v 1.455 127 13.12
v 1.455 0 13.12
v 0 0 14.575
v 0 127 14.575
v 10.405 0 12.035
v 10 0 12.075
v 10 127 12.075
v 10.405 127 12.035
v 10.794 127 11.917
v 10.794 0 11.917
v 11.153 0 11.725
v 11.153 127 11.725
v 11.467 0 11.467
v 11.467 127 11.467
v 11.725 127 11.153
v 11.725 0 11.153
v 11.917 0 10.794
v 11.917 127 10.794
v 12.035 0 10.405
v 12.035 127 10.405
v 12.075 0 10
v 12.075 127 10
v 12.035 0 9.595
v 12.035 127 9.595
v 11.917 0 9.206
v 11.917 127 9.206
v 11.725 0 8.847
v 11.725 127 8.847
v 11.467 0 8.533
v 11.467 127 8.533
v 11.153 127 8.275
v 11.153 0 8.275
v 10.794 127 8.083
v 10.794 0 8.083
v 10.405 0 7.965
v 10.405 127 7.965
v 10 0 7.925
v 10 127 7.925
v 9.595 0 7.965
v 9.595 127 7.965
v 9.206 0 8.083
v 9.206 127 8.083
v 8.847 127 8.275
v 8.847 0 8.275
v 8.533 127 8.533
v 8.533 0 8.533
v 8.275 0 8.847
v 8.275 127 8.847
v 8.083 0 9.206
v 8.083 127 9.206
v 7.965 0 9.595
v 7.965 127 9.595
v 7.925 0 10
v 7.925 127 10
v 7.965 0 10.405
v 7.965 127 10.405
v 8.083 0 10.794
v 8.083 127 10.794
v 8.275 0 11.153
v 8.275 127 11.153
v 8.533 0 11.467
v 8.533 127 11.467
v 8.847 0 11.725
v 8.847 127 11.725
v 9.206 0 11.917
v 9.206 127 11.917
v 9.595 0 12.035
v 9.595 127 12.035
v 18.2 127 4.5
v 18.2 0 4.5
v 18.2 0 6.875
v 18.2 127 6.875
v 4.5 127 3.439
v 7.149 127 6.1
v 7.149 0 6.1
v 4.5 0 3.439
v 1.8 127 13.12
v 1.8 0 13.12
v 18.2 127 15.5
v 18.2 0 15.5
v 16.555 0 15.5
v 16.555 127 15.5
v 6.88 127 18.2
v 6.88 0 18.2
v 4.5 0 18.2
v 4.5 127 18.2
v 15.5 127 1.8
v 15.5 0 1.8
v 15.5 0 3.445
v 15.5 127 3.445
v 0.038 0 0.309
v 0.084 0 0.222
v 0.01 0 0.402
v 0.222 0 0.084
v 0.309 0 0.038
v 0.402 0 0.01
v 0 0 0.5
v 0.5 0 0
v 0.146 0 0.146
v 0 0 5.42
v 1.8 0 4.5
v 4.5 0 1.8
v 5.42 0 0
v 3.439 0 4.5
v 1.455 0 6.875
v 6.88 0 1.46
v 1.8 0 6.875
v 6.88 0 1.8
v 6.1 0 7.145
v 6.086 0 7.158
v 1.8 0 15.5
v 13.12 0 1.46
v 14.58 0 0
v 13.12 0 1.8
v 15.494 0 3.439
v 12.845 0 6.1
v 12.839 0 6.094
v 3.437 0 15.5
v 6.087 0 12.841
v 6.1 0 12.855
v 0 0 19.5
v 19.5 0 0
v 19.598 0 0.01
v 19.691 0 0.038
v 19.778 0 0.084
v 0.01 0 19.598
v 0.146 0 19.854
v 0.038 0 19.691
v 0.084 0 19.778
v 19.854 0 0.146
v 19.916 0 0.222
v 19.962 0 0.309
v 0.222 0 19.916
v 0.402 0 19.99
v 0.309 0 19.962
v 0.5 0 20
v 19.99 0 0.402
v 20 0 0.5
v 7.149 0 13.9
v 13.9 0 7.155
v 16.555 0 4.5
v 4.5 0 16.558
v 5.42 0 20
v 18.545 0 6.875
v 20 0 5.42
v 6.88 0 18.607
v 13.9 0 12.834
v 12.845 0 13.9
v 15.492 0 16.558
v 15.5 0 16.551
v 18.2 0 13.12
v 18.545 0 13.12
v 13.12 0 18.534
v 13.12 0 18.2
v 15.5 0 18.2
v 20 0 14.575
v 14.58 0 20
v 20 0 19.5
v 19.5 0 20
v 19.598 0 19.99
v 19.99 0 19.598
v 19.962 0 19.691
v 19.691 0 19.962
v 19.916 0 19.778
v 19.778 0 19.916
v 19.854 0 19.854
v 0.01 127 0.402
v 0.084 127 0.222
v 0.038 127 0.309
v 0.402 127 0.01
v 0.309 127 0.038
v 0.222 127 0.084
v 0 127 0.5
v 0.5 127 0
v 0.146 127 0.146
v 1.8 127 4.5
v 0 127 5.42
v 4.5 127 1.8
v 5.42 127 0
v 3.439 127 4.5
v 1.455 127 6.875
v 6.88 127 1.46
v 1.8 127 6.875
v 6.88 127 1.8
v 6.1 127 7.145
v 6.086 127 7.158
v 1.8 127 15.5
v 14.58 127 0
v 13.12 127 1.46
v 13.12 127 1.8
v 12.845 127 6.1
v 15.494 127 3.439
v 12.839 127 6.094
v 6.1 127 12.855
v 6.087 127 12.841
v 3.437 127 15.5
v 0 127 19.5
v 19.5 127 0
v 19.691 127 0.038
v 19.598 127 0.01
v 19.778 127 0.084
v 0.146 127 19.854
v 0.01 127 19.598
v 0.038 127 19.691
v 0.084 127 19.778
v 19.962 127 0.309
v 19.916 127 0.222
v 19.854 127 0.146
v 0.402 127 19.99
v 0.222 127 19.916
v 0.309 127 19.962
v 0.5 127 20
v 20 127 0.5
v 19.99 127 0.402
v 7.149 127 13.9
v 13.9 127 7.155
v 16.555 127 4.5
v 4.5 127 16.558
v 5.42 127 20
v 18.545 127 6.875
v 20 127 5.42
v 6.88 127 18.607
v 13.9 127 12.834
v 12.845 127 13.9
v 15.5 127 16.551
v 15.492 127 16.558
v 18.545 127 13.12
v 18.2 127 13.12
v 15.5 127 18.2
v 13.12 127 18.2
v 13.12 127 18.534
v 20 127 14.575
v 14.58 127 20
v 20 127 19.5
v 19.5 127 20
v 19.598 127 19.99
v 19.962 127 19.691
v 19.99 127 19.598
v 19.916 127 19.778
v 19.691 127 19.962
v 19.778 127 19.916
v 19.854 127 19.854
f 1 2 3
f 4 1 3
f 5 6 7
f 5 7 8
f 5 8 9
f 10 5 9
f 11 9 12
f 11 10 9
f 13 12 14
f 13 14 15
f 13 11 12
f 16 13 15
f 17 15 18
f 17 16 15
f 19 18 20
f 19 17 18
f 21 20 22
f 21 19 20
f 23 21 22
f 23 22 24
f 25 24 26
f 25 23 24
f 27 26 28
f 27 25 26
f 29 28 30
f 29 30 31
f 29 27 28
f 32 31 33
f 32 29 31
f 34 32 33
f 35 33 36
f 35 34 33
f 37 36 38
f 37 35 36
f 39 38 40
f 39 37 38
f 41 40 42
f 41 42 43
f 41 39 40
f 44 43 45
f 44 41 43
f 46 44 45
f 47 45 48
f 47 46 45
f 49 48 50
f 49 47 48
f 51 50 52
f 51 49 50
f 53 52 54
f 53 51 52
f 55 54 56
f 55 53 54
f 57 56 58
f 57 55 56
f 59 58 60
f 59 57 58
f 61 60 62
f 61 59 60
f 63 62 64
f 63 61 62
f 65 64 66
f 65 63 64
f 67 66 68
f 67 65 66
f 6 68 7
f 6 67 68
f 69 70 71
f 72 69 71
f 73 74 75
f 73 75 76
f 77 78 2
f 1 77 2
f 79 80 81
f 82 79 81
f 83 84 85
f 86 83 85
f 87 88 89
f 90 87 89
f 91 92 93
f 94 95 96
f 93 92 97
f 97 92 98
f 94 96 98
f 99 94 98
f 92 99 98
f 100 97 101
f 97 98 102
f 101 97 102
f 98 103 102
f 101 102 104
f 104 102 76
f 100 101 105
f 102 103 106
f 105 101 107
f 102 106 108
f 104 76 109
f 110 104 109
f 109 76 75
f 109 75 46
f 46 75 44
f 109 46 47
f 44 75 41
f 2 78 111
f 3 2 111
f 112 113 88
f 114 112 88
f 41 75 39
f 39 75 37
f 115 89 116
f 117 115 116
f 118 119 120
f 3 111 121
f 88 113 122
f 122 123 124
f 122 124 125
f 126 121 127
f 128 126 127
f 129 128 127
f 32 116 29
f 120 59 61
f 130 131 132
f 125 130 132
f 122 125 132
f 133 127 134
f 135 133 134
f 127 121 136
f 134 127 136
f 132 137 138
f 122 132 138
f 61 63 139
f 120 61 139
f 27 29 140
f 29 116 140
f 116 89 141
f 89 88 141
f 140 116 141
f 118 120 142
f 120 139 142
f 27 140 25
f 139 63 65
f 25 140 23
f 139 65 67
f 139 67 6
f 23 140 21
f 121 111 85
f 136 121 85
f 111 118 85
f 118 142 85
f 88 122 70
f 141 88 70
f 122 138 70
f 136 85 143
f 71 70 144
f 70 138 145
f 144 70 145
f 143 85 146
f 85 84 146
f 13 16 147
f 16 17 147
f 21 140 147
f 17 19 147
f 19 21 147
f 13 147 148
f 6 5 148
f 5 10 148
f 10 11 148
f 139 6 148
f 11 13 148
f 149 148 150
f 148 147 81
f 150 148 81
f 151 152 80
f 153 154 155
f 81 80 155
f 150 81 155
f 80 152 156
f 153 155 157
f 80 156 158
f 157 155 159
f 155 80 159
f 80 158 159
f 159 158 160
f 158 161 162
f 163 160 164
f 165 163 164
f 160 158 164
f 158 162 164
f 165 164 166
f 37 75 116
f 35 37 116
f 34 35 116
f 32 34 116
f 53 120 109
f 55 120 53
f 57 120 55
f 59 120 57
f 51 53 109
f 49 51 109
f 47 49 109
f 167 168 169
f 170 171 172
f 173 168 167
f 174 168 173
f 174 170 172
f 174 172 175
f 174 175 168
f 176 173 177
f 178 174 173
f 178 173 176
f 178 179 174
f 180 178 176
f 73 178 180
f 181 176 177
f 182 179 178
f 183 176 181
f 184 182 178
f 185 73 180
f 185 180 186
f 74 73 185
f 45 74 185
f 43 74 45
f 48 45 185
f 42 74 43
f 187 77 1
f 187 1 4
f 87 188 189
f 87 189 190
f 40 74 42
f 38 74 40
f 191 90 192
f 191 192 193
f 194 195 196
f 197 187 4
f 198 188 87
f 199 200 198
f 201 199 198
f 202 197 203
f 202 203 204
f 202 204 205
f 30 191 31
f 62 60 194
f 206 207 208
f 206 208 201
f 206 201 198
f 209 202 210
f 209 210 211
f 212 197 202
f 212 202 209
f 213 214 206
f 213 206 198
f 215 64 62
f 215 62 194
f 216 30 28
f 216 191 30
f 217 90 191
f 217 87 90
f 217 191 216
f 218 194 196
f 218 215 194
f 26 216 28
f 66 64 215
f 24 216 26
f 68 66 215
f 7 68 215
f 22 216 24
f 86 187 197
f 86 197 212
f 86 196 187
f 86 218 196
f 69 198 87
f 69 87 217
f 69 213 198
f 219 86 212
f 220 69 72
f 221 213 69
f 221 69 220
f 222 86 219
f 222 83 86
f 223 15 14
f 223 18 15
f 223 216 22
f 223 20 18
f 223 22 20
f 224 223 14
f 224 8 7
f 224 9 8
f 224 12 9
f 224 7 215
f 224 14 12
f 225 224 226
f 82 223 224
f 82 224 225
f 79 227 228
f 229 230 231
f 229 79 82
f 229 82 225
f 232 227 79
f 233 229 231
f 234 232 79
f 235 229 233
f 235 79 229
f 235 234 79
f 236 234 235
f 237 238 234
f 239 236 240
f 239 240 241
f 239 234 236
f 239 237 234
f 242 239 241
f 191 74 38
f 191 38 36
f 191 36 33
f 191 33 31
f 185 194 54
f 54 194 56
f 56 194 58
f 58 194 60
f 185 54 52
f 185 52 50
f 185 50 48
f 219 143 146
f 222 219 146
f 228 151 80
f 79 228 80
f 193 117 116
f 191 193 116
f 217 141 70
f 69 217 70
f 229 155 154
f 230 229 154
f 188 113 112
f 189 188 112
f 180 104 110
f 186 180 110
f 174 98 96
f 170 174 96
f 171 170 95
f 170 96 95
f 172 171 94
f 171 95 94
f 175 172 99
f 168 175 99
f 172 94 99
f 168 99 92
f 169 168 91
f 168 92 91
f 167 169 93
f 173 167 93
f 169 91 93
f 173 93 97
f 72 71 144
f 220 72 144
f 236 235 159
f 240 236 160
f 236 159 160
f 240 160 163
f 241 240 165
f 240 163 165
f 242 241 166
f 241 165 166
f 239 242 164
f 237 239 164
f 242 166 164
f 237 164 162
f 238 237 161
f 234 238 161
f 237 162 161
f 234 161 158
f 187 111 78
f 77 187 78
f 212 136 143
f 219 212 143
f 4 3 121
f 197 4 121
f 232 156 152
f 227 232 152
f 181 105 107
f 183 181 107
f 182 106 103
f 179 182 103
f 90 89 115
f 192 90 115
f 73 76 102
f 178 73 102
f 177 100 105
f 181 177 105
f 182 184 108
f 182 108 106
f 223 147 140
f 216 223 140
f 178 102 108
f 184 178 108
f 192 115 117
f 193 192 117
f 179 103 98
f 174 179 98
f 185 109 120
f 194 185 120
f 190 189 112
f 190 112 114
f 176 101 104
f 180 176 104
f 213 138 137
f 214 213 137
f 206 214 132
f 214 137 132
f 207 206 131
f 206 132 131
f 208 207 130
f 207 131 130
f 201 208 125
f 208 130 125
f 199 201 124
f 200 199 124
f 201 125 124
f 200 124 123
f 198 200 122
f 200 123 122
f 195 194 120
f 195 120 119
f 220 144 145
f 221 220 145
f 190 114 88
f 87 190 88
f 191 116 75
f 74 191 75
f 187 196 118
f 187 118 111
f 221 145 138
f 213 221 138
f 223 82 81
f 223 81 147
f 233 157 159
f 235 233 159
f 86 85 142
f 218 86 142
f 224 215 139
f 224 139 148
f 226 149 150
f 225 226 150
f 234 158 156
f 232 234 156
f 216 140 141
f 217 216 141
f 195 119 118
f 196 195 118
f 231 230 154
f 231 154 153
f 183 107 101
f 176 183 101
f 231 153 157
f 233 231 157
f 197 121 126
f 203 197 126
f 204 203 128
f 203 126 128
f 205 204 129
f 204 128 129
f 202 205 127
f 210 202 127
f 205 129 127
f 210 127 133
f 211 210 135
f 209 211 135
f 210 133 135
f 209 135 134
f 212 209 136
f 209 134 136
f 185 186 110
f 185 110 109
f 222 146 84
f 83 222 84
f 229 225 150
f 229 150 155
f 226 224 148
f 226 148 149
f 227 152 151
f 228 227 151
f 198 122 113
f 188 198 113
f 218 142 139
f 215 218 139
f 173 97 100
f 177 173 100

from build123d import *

# Parameters (mm, degrees)
SKETCH2_R              = 2.074585303
VSLOT2020_2020_5_DEPTH = 127


with BuildPart() as part:
    # Sketch2 → Vslot2020 2020(5) (new body)
    with BuildSketch(Plane.ZX):
        with BuildLine():
            Line((13.9, 7.149086807), (13.9, 12.844511469))
            Line((13.9, 12.844511469), (16.558493656, 15.492177728))
            Line((16.558493656, 15.492177728), (16.550703242, 15.5))
            Line((16.550703242, 15.5), (18.2, 15.5))
            Line((18.2, 15.5), (18.2, 13.12))
            Line((18.2, 13.12), (18.534428266, 13.12))
            Line((18.534428266, 13.12), (20, 14.58))
            Line((20, 14.58), (20, 19.5))
            ThreePointArc((20, 19.5), (19.853553391, 19.853553391), (19.5, 20))
            Line((19.5, 20), (14.575, 20))
            Line((14.575, 20), (13.12, 18.545))
            Line((13.12, 18.545), (13.12, 18.2))
            Line((13.12, 18.2), (15.5, 18.2))
            Line((15.5, 18.2), (15.5, 16.555))
            Line((15.5, 16.555), (12.834142613, 13.9))
            Line((12.834142613, 13.9), (7.155, 13.9))
            Line((7.155, 13.9), (4.5, 16.555))
            Line((4.5, 16.555), (4.5, 18.2))
            Line((4.5, 18.2), (6.875, 18.2))
            Line((6.875, 18.2), (6.875, 18.545))
            Line((6.875, 18.545), (5.42, 20))
            Line((5.42, 20), (0.5, 20))
            ThreePointArc((0.5, 20), (0.146446609, 19.853553391), (0, 19.5))
            Line((0, 19.5), (0, 14.58))
            Line((0, 14.58), (1.46, 13.12))
            Line((1.46, 13.12), (1.8, 13.12))
            Line((1.8, 13.12), (1.8, 15.5))
            Line((1.8, 15.5), (3.445, 15.5))
            Line((3.445, 15.5), (3.439339828, 15.494339828))
            Line((3.439339828, 15.494339828), (6.094339828, 12.839339828))
            Line((6.094339828, 12.839339828), (6.1, 12.845))
            Line((6.1, 12.845), (6.1, 7.149086807))
            Line((6.1, 7.149086807), (3.439339828, 4.5))
            Line((3.439339828, 4.5), (1.8, 4.5))
            Line((1.8, 4.5), (1.8, 6.88))
            Line((1.8, 6.88), (1.46, 6.88))
            Line((1.46, 6.88), (0, 5.42))
            Line((0, 5.42), (0, 0.5))
            ThreePointArc((0, 0.5), (0.146446609, 0.146446609), (0.5, 0))
            Line((0.5, 0), (5.42, 0))
            Line((5.42, 0), (6.875, 1.455))
            Line((6.875, 1.455), (6.875, 1.8))
            Line((6.875, 1.8), (4.5, 1.8))
            Line((4.5, 1.8), (4.5, 3.4393348))
            Line((4.5, 3.4393348), (7.158345795, 6.086117297))
            Line((7.158345795, 6.086117297), (7.144523479, 6.1))
            Line((7.144523479, 6.1), (12.854625295, 6.1))
            Line((12.854625295, 6.1), (12.841221344, 6.086548451))
            Line((12.841221344, 6.086548451), (15.499715, 3.437461644))
            Line((15.499715, 3.437461644), (15.5, 1.8))
            Line((15.5, 1.8), (13.12, 1.8))
            Line((13.12, 1.8), (13.12, 1.455))
            Line((13.12, 1.455), (14.575, 0))
            Line((14.575, 0), (19.5, 0))
            ThreePointArc((19.5, 0), (19.853553391, 0.146446609), (20, 0.5))
            Line((20, 0.5), (20, 5.42))
            Line((20, 5.42), (18.606904708, 6.88))
            Line((18.606904708, 6.88), (18.2, 6.88))
            Line((18.2, 6.88), (18.2, 4.5))
            Line((18.2, 4.5), (16.558493656, 4.5))
            Line((16.558493656, 4.5), (13.9, 7.149086807))
        make_face()
        with Locations((10, 10)):
            Circle(SKETCH2_R, mode=Mode.SUBTRACT)
    extrude(amount=VSLOT2020_2020_5_DEPTH)


solid = part.part
